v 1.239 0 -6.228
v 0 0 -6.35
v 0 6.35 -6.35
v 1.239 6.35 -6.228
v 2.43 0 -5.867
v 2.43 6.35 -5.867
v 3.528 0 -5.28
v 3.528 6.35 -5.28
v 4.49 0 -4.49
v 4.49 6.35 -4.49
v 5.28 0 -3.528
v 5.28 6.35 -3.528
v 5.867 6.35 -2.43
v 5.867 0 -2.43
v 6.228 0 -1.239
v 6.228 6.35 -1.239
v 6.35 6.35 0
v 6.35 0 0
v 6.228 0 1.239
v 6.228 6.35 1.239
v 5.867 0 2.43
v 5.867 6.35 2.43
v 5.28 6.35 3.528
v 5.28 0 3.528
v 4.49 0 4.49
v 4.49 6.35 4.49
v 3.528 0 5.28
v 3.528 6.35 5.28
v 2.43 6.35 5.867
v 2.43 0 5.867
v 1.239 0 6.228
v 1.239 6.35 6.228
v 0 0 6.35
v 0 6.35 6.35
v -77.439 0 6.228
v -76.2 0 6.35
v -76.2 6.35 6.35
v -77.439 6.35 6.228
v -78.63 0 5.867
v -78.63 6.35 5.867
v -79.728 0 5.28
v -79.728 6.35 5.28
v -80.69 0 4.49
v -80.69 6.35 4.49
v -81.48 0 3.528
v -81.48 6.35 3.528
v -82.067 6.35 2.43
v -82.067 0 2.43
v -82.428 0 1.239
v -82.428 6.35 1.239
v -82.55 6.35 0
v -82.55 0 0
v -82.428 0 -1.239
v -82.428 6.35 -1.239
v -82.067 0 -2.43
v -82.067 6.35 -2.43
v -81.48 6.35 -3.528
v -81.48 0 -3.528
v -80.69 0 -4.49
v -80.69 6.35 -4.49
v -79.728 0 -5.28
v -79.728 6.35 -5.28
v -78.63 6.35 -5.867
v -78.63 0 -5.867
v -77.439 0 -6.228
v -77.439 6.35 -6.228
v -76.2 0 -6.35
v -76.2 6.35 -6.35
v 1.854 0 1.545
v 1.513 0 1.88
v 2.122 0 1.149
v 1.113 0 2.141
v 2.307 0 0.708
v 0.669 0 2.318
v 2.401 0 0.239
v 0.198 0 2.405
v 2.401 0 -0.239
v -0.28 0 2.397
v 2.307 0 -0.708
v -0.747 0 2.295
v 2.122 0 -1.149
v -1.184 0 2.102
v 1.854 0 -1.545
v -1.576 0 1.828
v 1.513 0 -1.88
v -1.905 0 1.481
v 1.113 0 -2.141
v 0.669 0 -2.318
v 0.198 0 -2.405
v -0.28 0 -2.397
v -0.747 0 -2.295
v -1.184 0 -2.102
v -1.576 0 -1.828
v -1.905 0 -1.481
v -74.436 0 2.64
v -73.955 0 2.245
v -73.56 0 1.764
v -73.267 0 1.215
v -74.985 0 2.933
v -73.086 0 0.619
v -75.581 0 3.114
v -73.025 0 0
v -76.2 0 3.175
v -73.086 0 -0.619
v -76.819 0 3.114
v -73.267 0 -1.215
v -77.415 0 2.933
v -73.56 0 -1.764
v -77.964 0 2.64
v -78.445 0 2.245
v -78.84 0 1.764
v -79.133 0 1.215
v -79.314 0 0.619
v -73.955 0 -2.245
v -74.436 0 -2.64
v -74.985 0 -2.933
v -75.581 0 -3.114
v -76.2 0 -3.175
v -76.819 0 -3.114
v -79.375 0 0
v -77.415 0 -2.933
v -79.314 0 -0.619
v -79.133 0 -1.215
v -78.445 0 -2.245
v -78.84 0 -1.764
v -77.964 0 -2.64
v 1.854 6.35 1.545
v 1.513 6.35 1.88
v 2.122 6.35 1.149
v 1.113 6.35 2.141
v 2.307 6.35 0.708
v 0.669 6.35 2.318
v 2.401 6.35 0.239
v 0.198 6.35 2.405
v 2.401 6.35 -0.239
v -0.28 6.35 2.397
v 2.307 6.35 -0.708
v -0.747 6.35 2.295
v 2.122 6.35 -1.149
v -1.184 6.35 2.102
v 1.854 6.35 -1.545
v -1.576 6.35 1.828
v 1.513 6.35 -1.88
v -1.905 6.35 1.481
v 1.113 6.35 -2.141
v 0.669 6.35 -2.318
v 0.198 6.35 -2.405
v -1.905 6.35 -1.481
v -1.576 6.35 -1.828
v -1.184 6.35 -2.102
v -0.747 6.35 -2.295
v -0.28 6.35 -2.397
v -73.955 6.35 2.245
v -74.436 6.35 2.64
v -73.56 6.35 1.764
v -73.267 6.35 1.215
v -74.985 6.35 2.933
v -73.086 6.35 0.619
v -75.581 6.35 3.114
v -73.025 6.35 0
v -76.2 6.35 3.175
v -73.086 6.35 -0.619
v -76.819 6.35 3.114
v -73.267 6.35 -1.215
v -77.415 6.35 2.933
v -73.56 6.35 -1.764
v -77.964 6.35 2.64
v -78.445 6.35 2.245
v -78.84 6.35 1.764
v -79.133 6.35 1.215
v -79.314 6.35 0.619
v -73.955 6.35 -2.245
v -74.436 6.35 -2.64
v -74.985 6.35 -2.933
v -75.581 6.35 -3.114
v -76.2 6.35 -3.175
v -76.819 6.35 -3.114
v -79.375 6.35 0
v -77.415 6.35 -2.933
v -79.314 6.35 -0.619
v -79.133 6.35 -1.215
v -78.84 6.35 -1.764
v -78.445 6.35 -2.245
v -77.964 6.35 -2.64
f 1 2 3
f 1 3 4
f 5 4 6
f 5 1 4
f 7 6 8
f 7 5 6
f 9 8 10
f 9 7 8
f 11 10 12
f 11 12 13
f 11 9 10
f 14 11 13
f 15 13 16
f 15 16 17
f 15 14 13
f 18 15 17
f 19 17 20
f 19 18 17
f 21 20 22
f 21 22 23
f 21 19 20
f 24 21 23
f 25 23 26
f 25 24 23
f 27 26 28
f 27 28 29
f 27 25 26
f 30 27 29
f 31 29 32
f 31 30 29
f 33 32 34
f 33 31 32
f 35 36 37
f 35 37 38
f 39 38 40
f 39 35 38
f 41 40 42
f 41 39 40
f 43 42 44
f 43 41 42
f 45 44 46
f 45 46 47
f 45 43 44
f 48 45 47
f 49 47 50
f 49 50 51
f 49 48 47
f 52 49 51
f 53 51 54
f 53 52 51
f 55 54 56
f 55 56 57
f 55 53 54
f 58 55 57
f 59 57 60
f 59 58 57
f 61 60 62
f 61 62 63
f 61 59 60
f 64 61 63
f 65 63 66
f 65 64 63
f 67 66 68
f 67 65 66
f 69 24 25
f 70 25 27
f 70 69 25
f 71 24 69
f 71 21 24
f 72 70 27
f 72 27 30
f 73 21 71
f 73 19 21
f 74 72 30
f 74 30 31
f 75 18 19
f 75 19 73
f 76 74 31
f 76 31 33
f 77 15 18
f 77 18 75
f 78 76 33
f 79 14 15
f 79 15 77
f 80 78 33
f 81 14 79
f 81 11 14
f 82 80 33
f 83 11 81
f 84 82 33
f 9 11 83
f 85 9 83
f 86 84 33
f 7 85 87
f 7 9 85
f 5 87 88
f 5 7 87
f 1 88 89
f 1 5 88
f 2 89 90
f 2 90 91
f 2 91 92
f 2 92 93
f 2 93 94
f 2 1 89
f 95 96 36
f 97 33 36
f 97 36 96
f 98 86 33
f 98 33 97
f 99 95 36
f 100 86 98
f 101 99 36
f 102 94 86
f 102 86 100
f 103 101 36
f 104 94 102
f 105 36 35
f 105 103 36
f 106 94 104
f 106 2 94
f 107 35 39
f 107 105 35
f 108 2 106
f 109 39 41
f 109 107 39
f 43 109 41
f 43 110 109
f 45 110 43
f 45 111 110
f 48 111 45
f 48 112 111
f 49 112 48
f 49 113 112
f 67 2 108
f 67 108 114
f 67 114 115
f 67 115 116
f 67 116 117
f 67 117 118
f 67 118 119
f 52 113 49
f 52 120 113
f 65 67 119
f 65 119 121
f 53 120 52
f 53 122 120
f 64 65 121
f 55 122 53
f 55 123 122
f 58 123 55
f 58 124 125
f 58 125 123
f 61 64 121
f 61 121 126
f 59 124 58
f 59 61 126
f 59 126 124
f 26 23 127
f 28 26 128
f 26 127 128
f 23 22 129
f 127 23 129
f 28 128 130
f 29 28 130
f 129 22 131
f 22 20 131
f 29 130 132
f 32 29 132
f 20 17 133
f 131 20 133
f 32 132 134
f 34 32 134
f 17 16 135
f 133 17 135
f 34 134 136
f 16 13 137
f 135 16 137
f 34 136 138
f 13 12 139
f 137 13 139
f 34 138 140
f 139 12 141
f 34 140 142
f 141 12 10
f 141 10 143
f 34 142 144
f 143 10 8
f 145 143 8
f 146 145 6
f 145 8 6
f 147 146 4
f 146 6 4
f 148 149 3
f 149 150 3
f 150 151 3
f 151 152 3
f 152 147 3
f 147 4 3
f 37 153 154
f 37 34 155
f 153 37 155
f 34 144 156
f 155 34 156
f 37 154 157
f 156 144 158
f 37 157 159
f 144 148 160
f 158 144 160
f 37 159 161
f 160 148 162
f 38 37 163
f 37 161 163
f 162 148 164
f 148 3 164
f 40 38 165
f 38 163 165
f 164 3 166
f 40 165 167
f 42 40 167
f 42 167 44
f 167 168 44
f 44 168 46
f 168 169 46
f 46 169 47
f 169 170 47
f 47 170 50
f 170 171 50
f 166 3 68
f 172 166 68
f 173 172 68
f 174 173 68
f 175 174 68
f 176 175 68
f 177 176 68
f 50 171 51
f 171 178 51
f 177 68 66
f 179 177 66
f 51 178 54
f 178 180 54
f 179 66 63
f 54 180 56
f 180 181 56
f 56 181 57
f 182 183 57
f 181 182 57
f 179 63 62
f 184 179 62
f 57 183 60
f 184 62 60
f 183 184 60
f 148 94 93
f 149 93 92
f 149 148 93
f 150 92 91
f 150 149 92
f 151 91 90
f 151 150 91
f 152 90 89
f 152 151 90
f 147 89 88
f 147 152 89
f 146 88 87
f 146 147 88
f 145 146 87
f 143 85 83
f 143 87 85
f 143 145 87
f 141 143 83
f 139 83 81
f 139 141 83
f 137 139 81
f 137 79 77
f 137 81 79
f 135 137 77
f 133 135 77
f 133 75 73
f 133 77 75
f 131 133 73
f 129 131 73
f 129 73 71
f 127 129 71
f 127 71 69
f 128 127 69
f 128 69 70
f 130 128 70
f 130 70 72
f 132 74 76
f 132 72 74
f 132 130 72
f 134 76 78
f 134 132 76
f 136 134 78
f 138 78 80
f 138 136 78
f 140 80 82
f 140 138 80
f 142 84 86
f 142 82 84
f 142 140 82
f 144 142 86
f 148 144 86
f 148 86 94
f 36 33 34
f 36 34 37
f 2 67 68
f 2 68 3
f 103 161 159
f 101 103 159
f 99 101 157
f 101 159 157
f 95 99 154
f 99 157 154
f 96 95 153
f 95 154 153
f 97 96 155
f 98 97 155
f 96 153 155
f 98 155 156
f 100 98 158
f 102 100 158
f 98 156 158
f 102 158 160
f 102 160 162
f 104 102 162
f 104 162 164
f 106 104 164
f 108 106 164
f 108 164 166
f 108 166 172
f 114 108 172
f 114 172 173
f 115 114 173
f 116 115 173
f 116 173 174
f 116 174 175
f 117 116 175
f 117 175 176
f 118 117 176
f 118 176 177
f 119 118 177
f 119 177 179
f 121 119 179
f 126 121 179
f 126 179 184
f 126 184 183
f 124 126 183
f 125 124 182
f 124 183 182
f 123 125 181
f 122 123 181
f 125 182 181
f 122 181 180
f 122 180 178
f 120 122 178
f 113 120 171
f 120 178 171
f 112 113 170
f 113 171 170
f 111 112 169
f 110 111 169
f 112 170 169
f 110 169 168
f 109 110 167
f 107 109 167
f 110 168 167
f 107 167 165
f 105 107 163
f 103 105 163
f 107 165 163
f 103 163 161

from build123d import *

# Parameters (mm, degrees)
BOSS_EXTRUDE1_DEPTH = 6.35
CUT_EXTRUDE1_DEPTH  = 84.037024874
SKETCH4_R           = 3.175
CUT_EXTRUDE3_DEPTH  = 84.037024874


with BuildPart() as part:
    # Sketch1 → Boss-Extrude1 (new body)
    with BuildSketch(Plane(origin=(0, 0, 0), x_dir=(1, 0, 0), z_dir=(0, 1, 0))):
        with BuildLine():
            Line((0, -6.35), (-76.2, -6.35))
            ThreePointArc((-76.2, -6.35), (-82.55, 0), (-76.2, 6.35))
            Line((-76.2, 6.35), (0, 6.35))
            ThreePointArc((0, 6.35), (6.35, 0), (0, -6.35))
        make_face()
    extrude(amount=BOSS_EXTRUDE1_DEPTH)

    # Sketch2 → Cut-Extrude1 (cut, through all)
    with BuildSketch(Plane(origin=(0, 6.35, 0), x_dir=(1, 0, 0), z_dir=(0, 1, 0))):
        with BuildLine():
            Line((-1.905, -1.481061781), (-1.905, 1.481061781))
            ThreePointArc((-1.905, 1.481061781), (2.413, 0), (-1.905, -1.481061781))
        make_face()
    extrude(amount=-CUT_EXTRUDE1_DEPTH, mode=Mode.SUBTRACT)

    # Sketch4 → Cut-Extrude3 (cut, through all)
    with BuildSketch(Plane(origin=(0, 6.35, 0), x_dir=(1, 0, 0), z_dir=(0, 1, 0))):
        with Locations(Location((-76.2, 0, 0), (0, 0, 270))):
            Circle(SKETCH4_R)
    extrude(amount=-CUT_EXTRUDE3_DEPTH, mode=Mode.SUBTRACT)


solid = part.part
